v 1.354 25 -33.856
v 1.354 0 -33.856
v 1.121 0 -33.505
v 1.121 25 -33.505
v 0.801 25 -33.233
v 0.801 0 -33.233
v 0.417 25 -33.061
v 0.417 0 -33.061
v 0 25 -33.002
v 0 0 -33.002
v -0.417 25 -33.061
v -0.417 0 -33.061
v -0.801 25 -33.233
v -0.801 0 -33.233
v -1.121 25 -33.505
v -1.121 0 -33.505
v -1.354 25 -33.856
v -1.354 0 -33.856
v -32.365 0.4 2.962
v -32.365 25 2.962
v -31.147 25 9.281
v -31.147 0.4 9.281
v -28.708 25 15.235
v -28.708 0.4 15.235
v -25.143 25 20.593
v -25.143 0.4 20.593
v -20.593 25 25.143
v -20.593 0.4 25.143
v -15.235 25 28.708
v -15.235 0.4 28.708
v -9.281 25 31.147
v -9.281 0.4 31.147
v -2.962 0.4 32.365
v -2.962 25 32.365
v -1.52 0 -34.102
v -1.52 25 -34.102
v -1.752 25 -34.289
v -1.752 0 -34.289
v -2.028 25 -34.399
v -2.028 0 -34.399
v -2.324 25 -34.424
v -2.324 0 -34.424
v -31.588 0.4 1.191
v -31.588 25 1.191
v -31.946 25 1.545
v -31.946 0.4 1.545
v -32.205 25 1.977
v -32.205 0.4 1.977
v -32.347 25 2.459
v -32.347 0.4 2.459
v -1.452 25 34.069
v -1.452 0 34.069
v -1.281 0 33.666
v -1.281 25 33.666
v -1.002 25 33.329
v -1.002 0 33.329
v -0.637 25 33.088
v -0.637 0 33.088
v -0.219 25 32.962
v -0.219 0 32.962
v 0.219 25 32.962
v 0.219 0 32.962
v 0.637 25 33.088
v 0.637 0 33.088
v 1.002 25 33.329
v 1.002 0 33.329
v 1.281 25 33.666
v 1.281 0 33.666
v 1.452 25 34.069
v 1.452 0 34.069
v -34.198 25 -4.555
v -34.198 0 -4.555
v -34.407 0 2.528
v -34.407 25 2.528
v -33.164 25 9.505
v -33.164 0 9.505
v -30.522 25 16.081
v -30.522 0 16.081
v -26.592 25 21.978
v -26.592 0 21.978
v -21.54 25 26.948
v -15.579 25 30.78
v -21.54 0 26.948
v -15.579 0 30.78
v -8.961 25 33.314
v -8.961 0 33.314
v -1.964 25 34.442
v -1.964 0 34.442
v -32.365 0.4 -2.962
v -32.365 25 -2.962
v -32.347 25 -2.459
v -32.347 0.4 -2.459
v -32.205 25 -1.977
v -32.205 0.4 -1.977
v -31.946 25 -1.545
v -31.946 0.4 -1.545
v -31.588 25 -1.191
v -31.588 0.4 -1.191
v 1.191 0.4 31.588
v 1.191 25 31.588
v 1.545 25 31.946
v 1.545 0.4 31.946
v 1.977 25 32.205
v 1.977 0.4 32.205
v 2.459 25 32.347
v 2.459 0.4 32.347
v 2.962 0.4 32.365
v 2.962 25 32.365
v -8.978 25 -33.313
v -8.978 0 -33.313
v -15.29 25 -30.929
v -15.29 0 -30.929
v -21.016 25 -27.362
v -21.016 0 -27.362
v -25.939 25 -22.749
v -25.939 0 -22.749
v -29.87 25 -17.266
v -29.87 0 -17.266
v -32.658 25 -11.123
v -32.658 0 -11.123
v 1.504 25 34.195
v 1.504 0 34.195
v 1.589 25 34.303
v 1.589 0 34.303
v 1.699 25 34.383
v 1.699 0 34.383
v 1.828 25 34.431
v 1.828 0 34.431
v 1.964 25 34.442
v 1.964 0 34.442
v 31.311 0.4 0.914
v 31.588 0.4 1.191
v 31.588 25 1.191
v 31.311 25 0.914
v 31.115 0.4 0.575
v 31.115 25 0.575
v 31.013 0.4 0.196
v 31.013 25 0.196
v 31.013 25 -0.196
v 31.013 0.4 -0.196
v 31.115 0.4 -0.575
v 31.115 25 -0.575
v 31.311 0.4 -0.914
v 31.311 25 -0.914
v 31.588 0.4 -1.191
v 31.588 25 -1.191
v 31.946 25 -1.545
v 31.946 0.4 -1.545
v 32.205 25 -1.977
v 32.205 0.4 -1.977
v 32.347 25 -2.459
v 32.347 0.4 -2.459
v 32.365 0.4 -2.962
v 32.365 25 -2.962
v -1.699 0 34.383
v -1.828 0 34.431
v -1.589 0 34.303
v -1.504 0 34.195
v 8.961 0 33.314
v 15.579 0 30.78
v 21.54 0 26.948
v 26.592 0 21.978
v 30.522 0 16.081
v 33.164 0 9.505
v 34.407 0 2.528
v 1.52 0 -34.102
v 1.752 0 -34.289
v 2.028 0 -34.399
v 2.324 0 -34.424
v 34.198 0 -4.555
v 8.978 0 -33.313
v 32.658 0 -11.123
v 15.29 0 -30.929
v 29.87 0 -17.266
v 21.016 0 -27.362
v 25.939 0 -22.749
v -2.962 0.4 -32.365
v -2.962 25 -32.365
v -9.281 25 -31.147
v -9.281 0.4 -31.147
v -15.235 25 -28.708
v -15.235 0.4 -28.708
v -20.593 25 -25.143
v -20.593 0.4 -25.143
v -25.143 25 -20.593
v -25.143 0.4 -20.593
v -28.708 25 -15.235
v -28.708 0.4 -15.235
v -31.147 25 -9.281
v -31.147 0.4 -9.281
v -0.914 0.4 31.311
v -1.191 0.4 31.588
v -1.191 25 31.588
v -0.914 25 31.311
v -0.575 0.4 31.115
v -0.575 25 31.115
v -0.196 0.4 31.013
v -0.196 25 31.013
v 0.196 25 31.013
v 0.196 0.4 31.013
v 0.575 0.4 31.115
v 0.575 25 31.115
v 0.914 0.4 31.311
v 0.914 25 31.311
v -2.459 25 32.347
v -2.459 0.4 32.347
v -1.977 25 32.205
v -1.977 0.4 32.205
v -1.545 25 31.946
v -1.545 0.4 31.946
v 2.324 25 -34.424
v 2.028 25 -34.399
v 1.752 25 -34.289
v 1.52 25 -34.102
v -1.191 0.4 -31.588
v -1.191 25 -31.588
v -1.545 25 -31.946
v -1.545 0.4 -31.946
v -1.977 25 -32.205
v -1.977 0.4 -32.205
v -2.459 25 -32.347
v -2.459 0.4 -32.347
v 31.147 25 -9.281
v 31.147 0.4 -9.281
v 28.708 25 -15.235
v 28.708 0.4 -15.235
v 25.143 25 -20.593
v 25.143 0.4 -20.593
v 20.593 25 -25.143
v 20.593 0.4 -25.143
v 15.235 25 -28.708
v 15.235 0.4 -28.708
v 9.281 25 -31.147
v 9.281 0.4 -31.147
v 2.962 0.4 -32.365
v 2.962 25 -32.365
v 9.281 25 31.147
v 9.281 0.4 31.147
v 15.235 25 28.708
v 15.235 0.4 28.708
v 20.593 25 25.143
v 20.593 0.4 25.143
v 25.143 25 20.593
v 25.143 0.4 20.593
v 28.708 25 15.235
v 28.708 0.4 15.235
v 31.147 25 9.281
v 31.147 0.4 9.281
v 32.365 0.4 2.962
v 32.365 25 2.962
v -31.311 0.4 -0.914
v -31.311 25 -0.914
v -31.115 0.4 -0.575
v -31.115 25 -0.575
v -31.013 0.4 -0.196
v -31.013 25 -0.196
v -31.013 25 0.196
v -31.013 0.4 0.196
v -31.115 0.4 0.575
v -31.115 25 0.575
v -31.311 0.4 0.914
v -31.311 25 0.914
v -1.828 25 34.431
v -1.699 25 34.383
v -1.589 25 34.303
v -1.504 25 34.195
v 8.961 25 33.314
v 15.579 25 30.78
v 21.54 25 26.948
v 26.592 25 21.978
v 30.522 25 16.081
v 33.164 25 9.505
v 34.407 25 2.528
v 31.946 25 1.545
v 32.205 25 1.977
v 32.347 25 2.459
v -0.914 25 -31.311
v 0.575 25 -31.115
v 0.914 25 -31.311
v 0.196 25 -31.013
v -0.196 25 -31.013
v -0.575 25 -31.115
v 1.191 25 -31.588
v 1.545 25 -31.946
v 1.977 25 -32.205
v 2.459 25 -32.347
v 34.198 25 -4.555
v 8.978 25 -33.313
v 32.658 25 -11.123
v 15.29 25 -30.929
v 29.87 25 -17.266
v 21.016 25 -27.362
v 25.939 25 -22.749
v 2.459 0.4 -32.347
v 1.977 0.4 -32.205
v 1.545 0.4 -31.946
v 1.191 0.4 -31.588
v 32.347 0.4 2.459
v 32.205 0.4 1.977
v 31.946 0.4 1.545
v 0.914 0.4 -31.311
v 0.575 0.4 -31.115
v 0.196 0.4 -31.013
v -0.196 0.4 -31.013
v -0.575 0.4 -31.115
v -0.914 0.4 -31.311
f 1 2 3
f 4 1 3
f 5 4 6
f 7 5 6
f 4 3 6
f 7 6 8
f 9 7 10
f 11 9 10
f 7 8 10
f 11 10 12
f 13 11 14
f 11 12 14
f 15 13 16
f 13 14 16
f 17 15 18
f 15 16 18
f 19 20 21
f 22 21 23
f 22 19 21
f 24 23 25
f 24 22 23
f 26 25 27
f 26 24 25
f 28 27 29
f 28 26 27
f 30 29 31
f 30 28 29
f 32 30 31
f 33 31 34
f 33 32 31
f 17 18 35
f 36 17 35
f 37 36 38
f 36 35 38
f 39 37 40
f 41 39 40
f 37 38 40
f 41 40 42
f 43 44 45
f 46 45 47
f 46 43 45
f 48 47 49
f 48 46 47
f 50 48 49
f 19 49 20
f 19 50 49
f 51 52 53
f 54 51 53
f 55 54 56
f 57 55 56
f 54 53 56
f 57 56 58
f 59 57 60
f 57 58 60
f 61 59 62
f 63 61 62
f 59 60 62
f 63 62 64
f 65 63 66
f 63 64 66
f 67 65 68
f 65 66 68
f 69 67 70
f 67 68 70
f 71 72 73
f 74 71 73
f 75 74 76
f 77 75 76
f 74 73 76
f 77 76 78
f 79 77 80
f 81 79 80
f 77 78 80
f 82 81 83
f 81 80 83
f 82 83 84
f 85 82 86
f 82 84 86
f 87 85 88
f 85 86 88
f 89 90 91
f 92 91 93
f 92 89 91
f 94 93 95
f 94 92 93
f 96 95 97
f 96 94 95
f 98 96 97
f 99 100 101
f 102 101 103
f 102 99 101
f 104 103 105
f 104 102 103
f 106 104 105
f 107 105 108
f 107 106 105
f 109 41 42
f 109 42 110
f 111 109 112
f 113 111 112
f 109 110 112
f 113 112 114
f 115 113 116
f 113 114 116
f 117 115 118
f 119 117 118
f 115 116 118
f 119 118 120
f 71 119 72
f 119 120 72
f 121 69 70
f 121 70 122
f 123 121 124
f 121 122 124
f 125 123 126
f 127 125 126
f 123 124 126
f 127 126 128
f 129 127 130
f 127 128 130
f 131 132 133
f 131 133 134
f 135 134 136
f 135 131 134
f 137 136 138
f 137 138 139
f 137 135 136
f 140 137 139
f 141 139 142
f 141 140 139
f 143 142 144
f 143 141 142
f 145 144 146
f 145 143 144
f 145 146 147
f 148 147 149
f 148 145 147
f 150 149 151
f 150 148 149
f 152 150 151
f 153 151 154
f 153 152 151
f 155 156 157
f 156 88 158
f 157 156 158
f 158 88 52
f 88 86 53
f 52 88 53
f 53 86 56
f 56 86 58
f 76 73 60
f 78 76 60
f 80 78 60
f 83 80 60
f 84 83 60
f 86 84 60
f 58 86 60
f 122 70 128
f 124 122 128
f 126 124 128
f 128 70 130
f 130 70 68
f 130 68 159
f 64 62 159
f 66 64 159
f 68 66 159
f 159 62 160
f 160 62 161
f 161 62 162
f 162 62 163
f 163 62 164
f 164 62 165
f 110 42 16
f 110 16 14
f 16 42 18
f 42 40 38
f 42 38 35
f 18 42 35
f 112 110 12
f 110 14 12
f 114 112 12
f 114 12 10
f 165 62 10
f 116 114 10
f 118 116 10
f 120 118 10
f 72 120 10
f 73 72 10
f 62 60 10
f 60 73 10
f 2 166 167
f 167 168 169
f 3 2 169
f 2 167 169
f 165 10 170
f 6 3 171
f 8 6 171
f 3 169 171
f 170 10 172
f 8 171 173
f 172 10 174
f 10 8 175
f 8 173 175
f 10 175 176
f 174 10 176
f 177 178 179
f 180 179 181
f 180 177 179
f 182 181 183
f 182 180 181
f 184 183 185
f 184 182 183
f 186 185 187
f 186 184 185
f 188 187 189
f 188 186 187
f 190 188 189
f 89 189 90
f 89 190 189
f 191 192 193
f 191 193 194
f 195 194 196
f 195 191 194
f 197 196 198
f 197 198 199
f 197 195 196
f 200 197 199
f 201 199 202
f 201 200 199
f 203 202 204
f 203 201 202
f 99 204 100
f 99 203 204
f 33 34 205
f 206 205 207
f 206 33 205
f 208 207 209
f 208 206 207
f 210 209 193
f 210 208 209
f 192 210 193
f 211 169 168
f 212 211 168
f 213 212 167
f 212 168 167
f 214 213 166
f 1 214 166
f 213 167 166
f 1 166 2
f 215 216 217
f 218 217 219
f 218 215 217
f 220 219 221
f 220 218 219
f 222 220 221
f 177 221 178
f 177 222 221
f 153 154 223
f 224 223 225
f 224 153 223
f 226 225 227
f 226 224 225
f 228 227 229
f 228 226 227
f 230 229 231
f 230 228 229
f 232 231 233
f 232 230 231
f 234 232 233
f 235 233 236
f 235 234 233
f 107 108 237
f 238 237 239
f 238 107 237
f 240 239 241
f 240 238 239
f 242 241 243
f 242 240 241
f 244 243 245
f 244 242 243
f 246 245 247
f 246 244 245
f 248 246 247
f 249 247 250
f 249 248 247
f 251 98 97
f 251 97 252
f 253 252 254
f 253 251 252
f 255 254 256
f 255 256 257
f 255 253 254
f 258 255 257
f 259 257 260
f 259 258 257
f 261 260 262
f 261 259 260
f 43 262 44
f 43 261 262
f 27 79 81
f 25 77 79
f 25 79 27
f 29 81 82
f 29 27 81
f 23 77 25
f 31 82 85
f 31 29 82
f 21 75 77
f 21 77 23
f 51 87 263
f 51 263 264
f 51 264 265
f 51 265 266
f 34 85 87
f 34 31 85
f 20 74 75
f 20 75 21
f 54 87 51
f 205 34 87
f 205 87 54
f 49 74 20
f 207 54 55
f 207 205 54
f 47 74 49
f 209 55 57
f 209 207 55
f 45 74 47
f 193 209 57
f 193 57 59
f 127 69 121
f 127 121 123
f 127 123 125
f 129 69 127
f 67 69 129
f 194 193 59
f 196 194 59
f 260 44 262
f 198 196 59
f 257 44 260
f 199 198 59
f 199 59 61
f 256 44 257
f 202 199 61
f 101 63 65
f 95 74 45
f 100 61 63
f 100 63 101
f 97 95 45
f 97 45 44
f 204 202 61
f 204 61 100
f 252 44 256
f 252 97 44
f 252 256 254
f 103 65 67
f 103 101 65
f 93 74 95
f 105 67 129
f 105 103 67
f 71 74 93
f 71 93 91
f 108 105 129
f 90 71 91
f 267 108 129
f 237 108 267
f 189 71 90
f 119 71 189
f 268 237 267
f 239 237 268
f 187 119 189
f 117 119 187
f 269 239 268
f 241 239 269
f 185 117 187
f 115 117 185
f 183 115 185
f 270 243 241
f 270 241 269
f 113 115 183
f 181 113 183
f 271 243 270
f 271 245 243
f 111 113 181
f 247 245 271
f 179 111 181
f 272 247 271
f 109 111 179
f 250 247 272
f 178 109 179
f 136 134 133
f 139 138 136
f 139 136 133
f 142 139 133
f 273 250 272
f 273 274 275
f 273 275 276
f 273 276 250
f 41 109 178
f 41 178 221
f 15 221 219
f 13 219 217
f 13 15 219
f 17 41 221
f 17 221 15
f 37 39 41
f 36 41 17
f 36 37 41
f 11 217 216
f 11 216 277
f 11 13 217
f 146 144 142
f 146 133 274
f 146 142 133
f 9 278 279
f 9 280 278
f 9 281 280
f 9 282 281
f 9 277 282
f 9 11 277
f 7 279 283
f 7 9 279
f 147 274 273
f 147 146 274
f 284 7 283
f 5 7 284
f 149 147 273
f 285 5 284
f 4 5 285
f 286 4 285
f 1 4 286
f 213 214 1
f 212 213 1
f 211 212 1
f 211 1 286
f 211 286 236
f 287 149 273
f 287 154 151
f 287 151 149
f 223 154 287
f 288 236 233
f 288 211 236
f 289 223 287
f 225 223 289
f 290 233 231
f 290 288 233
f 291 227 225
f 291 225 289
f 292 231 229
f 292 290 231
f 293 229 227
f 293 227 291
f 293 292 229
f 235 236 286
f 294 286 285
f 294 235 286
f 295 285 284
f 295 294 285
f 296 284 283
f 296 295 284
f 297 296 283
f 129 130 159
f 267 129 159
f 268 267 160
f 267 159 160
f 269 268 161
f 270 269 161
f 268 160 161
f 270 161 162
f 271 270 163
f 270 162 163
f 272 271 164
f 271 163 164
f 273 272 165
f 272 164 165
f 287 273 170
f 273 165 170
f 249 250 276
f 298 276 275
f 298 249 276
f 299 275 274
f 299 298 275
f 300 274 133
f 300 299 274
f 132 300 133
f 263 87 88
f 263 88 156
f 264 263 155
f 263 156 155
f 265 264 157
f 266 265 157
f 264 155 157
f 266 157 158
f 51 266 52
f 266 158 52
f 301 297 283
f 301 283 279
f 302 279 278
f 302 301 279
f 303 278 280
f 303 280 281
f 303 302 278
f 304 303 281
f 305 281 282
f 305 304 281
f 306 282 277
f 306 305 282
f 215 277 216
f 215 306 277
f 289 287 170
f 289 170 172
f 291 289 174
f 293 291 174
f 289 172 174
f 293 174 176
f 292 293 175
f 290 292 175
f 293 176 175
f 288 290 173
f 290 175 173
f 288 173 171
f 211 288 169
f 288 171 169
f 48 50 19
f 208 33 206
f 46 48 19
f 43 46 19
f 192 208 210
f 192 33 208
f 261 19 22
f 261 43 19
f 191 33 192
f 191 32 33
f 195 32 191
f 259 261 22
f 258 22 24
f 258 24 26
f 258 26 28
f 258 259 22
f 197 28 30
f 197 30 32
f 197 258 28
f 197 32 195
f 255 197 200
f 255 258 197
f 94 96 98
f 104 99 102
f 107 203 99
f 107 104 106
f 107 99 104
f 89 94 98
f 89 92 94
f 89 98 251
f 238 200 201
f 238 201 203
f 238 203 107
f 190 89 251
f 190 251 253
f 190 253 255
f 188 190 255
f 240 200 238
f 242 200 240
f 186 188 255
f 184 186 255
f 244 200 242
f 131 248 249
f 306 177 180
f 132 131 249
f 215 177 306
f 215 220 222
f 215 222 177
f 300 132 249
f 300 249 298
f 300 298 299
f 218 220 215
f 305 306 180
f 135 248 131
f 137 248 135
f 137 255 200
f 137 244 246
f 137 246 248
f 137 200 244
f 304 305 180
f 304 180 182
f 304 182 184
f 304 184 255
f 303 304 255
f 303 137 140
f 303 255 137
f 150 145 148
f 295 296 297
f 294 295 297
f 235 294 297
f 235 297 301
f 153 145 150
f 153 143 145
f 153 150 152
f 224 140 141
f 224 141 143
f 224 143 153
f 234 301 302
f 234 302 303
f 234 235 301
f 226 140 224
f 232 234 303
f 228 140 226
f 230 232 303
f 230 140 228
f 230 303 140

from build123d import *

# Parameters (mm, degrees)
BOSS_EXTRUDE1_DEPTH = 25
CUT_EXTRUDE2_DEPTH  = 26
BOSS_EXTRUDE2_DEPTH = 0.4


with BuildPart() as part:
    # Sketch1 → Boss-Extrude1 (new body)
    with BuildSketch(Plane(origin=(0, 0, 0), x_dir=(1, 0, 0), z_dir=(0, 1, 0))):
        with BuildLine():
            ThreePointArc((1.451818925, -34.068556857), (1.641248992, -34.346908706), (1.964225605, -34.442038138))
            ThreePointArc((1.964225605, -34.442038138), (26.591847487, -21.978073076), (34.198225299, 4.555174015))
            ThreePointArc((34.198225299, 4.555174015), (23.590291339, 25.176355888), (2.324135821, 34.423627607))
            ThreePointArc((2.324135821, 34.423627607), (1.751838249, 34.289058819), (1.354061739, 33.856153382))
            ThreePointArc((1.354061739, 33.856153382), (0, 33.001534515), (-1.354061739, 33.856153382))
            ThreePointArc((-1.354061739, 33.856153382), (-1.751838249, 34.289058819), (-2.324135821, 34.423627607))
            ThreePointArc((-2.324135821, 34.423627607), (-23.590291339, 25.176355888), (-34.198225299, 4.555174015))
            ThreePointArc((-34.198225299, 4.555174015), (-26.591847487, -21.978073076), (-1.964225605, -34.442038138))
            ThreePointArc((-1.964225605, -34.442038138), (-1.641248992, -34.346908706), (-1.451818925, -34.068556857))
            ThreePointArc((-1.451818925, -34.068556857), (0, -32.945679925), (1.451818925, -34.068556857))
        make_face()
        with BuildLine():
            Line((-2.417, 3.787737139), (0, 3.787737139))
            Line((0, 3.787737139), (2.417, 3.787737139))
            ThreePointArc((2.417, 3.787737139), (0, -4.489512172), (-2.417, 3.787737139))
        make_face(mode=Mode.SUBTRACT)
    extrude(amount=BOSS_EXTRUDE1_DEPTH)

    # Sketch2 → Cut-Extrude2 (cut, through all)
    with BuildSketch(Plane(origin=(0, 0, 0), x_dir=(1, 0, 0), z_dir=(0, 1, 0))):
        with BuildLine():
            ThreePointArc((-32.364754098, -2.961873082), (-22.980970389, -22.980970389), (-2.961873082, -32.364754098))
            ThreePointArc((-2.961873082, -32.364754098), (-1.976534873, -32.204764677), (-1.191258844, -31.588461538))
            ThreePointArc((-1.191258844, -31.588461538), (0, -31), (1.191258844, -31.588461538))
            ThreePointArc((1.191258844, -31.588461538), (1.976534873, -32.204764677), (2.961873082, -32.364754098))
            ThreePointArc((2.961873082, -32.364754098), (22.980970389, -22.980970389), (32.364754098, -2.961873082))
            ThreePointArc((32.364754098, -2.961873082), (32.204764677, -1.976534873), (31.588461538, -1.191258844))
            ThreePointArc((31.588461538, -1.191258844), (31, 0), (31.588461538, 1.191258844))
            ThreePointArc((31.588461538, 1.191258844), (32.204764677, 1.976534873), (32.364754098, 2.961873082))
            ThreePointArc((32.364754098, 2.961873082), (22.980970389, 22.980970389), (2.961873082, 32.364754098))
            ThreePointArc((2.961873082, 32.364754098), (1.976534873, 32.204764677), (1.191258844, 31.588461538))
            ThreePointArc((1.191258844, 31.588461538), (0, 31), (-1.191258844, 31.588461538))
            ThreePointArc((-1.191258844, 31.588461538), (-1.976534873, 32.204764677), (-2.961873082, 32.364754098))
            ThreePointArc((-2.961873082, 32.364754098), (-22.980970389, 22.980970389), (-32.364754098, 2.961873082))
            ThreePointArc((-32.364754098, 2.961873082), (-32.204764677, 1.976534873), (-31.588461538, 1.191258844))
            ThreePointArc((-31.588461538, 1.191258844), (-31, 0), (-31.588461538, -1.191258844))
            ThreePointArc((-31.588461538, -1.191258844), (-32.204764677, -1.976534873), (-32.364754098, -2.961873082))
        make_face()
    extrude(amount=CUT_EXTRUDE2_DEPTH, mode=Mode.SUBTRACT)

    # Sketch2<2> → Boss-Extrude2 (add)
    with BuildSketch(Plane(origin=(0, 0, 0), x_dir=(1, 0, 0), z_dir=(0, 1, 0))):
        with BuildLine():
            ThreePointArc((-32.364754098, -2.961873082), (-22.980970389, -22.980970389), (-2.961873082, -32.364754098))
            ThreePointArc((-2.961873082, -32.364754098), (-1.976534873, -32.204764677), (-1.191258844, -31.588461538))
            ThreePointArc((-1.191258844, -31.588461538), (0, -31), (1.191258844, -31.588461538))
            ThreePointArc((1.191258844, -31.588461538), (1.976534873, -32.204764677), (2.961873082, -32.364754098))
            ThreePointArc((2.961873082, -32.364754098), (22.980970389, -22.980970389), (32.364754098, -2.961873082))
            ThreePointArc((32.364754098, -2.961873082), (32.204764677, -1.976534873), (31.588461538, -1.191258844))
            ThreePointArc((31.588461538, -1.191258844), (31, 0), (31.588461538, 1.191258844))
            ThreePointArc((31.588461538, 1.191258844), (32.204764677, 1.976534873), (32.364754098, 2.961873082))
            ThreePointArc((32.364754098, 2.961873082), (22.980970389, 22.980970389), (2.961873082, 32.364754098))
            ThreePointArc((2.961873082, 32.364754098), (1.976534873, 32.204764677), (1.191258844, 31.588461538))
            ThreePointArc((1.191258844, 31.588461538), (0, 31), (-1.191258844, 31.588461538))
            ThreePointArc((-1.191258844, 31.588461538), (-1.976534873, 32.204764677), (-2.961873082, 32.364754098))
            ThreePointArc((-2.961873082, 32.364754098), (-22.980970389, 22.980970389), (-32.364754098, 2.961873082))
            ThreePointArc((-32.364754098, 2.961873082), (-32.204764677, 1.976534873), (-31.588461538, 1.191258844))
            ThreePointArc((-31.588461538, 1.191258844), (-31, 0), (-31.588461538, -1.191258844))
            ThreePointArc((-31.588461538, -1.191258844), (-32.204764677, -1.976534873), (-32.364754098, -2.961873082))
        make_face()
    extrude(amount=BOSS_EXTRUDE2_DEPTH)


solid = part.part
